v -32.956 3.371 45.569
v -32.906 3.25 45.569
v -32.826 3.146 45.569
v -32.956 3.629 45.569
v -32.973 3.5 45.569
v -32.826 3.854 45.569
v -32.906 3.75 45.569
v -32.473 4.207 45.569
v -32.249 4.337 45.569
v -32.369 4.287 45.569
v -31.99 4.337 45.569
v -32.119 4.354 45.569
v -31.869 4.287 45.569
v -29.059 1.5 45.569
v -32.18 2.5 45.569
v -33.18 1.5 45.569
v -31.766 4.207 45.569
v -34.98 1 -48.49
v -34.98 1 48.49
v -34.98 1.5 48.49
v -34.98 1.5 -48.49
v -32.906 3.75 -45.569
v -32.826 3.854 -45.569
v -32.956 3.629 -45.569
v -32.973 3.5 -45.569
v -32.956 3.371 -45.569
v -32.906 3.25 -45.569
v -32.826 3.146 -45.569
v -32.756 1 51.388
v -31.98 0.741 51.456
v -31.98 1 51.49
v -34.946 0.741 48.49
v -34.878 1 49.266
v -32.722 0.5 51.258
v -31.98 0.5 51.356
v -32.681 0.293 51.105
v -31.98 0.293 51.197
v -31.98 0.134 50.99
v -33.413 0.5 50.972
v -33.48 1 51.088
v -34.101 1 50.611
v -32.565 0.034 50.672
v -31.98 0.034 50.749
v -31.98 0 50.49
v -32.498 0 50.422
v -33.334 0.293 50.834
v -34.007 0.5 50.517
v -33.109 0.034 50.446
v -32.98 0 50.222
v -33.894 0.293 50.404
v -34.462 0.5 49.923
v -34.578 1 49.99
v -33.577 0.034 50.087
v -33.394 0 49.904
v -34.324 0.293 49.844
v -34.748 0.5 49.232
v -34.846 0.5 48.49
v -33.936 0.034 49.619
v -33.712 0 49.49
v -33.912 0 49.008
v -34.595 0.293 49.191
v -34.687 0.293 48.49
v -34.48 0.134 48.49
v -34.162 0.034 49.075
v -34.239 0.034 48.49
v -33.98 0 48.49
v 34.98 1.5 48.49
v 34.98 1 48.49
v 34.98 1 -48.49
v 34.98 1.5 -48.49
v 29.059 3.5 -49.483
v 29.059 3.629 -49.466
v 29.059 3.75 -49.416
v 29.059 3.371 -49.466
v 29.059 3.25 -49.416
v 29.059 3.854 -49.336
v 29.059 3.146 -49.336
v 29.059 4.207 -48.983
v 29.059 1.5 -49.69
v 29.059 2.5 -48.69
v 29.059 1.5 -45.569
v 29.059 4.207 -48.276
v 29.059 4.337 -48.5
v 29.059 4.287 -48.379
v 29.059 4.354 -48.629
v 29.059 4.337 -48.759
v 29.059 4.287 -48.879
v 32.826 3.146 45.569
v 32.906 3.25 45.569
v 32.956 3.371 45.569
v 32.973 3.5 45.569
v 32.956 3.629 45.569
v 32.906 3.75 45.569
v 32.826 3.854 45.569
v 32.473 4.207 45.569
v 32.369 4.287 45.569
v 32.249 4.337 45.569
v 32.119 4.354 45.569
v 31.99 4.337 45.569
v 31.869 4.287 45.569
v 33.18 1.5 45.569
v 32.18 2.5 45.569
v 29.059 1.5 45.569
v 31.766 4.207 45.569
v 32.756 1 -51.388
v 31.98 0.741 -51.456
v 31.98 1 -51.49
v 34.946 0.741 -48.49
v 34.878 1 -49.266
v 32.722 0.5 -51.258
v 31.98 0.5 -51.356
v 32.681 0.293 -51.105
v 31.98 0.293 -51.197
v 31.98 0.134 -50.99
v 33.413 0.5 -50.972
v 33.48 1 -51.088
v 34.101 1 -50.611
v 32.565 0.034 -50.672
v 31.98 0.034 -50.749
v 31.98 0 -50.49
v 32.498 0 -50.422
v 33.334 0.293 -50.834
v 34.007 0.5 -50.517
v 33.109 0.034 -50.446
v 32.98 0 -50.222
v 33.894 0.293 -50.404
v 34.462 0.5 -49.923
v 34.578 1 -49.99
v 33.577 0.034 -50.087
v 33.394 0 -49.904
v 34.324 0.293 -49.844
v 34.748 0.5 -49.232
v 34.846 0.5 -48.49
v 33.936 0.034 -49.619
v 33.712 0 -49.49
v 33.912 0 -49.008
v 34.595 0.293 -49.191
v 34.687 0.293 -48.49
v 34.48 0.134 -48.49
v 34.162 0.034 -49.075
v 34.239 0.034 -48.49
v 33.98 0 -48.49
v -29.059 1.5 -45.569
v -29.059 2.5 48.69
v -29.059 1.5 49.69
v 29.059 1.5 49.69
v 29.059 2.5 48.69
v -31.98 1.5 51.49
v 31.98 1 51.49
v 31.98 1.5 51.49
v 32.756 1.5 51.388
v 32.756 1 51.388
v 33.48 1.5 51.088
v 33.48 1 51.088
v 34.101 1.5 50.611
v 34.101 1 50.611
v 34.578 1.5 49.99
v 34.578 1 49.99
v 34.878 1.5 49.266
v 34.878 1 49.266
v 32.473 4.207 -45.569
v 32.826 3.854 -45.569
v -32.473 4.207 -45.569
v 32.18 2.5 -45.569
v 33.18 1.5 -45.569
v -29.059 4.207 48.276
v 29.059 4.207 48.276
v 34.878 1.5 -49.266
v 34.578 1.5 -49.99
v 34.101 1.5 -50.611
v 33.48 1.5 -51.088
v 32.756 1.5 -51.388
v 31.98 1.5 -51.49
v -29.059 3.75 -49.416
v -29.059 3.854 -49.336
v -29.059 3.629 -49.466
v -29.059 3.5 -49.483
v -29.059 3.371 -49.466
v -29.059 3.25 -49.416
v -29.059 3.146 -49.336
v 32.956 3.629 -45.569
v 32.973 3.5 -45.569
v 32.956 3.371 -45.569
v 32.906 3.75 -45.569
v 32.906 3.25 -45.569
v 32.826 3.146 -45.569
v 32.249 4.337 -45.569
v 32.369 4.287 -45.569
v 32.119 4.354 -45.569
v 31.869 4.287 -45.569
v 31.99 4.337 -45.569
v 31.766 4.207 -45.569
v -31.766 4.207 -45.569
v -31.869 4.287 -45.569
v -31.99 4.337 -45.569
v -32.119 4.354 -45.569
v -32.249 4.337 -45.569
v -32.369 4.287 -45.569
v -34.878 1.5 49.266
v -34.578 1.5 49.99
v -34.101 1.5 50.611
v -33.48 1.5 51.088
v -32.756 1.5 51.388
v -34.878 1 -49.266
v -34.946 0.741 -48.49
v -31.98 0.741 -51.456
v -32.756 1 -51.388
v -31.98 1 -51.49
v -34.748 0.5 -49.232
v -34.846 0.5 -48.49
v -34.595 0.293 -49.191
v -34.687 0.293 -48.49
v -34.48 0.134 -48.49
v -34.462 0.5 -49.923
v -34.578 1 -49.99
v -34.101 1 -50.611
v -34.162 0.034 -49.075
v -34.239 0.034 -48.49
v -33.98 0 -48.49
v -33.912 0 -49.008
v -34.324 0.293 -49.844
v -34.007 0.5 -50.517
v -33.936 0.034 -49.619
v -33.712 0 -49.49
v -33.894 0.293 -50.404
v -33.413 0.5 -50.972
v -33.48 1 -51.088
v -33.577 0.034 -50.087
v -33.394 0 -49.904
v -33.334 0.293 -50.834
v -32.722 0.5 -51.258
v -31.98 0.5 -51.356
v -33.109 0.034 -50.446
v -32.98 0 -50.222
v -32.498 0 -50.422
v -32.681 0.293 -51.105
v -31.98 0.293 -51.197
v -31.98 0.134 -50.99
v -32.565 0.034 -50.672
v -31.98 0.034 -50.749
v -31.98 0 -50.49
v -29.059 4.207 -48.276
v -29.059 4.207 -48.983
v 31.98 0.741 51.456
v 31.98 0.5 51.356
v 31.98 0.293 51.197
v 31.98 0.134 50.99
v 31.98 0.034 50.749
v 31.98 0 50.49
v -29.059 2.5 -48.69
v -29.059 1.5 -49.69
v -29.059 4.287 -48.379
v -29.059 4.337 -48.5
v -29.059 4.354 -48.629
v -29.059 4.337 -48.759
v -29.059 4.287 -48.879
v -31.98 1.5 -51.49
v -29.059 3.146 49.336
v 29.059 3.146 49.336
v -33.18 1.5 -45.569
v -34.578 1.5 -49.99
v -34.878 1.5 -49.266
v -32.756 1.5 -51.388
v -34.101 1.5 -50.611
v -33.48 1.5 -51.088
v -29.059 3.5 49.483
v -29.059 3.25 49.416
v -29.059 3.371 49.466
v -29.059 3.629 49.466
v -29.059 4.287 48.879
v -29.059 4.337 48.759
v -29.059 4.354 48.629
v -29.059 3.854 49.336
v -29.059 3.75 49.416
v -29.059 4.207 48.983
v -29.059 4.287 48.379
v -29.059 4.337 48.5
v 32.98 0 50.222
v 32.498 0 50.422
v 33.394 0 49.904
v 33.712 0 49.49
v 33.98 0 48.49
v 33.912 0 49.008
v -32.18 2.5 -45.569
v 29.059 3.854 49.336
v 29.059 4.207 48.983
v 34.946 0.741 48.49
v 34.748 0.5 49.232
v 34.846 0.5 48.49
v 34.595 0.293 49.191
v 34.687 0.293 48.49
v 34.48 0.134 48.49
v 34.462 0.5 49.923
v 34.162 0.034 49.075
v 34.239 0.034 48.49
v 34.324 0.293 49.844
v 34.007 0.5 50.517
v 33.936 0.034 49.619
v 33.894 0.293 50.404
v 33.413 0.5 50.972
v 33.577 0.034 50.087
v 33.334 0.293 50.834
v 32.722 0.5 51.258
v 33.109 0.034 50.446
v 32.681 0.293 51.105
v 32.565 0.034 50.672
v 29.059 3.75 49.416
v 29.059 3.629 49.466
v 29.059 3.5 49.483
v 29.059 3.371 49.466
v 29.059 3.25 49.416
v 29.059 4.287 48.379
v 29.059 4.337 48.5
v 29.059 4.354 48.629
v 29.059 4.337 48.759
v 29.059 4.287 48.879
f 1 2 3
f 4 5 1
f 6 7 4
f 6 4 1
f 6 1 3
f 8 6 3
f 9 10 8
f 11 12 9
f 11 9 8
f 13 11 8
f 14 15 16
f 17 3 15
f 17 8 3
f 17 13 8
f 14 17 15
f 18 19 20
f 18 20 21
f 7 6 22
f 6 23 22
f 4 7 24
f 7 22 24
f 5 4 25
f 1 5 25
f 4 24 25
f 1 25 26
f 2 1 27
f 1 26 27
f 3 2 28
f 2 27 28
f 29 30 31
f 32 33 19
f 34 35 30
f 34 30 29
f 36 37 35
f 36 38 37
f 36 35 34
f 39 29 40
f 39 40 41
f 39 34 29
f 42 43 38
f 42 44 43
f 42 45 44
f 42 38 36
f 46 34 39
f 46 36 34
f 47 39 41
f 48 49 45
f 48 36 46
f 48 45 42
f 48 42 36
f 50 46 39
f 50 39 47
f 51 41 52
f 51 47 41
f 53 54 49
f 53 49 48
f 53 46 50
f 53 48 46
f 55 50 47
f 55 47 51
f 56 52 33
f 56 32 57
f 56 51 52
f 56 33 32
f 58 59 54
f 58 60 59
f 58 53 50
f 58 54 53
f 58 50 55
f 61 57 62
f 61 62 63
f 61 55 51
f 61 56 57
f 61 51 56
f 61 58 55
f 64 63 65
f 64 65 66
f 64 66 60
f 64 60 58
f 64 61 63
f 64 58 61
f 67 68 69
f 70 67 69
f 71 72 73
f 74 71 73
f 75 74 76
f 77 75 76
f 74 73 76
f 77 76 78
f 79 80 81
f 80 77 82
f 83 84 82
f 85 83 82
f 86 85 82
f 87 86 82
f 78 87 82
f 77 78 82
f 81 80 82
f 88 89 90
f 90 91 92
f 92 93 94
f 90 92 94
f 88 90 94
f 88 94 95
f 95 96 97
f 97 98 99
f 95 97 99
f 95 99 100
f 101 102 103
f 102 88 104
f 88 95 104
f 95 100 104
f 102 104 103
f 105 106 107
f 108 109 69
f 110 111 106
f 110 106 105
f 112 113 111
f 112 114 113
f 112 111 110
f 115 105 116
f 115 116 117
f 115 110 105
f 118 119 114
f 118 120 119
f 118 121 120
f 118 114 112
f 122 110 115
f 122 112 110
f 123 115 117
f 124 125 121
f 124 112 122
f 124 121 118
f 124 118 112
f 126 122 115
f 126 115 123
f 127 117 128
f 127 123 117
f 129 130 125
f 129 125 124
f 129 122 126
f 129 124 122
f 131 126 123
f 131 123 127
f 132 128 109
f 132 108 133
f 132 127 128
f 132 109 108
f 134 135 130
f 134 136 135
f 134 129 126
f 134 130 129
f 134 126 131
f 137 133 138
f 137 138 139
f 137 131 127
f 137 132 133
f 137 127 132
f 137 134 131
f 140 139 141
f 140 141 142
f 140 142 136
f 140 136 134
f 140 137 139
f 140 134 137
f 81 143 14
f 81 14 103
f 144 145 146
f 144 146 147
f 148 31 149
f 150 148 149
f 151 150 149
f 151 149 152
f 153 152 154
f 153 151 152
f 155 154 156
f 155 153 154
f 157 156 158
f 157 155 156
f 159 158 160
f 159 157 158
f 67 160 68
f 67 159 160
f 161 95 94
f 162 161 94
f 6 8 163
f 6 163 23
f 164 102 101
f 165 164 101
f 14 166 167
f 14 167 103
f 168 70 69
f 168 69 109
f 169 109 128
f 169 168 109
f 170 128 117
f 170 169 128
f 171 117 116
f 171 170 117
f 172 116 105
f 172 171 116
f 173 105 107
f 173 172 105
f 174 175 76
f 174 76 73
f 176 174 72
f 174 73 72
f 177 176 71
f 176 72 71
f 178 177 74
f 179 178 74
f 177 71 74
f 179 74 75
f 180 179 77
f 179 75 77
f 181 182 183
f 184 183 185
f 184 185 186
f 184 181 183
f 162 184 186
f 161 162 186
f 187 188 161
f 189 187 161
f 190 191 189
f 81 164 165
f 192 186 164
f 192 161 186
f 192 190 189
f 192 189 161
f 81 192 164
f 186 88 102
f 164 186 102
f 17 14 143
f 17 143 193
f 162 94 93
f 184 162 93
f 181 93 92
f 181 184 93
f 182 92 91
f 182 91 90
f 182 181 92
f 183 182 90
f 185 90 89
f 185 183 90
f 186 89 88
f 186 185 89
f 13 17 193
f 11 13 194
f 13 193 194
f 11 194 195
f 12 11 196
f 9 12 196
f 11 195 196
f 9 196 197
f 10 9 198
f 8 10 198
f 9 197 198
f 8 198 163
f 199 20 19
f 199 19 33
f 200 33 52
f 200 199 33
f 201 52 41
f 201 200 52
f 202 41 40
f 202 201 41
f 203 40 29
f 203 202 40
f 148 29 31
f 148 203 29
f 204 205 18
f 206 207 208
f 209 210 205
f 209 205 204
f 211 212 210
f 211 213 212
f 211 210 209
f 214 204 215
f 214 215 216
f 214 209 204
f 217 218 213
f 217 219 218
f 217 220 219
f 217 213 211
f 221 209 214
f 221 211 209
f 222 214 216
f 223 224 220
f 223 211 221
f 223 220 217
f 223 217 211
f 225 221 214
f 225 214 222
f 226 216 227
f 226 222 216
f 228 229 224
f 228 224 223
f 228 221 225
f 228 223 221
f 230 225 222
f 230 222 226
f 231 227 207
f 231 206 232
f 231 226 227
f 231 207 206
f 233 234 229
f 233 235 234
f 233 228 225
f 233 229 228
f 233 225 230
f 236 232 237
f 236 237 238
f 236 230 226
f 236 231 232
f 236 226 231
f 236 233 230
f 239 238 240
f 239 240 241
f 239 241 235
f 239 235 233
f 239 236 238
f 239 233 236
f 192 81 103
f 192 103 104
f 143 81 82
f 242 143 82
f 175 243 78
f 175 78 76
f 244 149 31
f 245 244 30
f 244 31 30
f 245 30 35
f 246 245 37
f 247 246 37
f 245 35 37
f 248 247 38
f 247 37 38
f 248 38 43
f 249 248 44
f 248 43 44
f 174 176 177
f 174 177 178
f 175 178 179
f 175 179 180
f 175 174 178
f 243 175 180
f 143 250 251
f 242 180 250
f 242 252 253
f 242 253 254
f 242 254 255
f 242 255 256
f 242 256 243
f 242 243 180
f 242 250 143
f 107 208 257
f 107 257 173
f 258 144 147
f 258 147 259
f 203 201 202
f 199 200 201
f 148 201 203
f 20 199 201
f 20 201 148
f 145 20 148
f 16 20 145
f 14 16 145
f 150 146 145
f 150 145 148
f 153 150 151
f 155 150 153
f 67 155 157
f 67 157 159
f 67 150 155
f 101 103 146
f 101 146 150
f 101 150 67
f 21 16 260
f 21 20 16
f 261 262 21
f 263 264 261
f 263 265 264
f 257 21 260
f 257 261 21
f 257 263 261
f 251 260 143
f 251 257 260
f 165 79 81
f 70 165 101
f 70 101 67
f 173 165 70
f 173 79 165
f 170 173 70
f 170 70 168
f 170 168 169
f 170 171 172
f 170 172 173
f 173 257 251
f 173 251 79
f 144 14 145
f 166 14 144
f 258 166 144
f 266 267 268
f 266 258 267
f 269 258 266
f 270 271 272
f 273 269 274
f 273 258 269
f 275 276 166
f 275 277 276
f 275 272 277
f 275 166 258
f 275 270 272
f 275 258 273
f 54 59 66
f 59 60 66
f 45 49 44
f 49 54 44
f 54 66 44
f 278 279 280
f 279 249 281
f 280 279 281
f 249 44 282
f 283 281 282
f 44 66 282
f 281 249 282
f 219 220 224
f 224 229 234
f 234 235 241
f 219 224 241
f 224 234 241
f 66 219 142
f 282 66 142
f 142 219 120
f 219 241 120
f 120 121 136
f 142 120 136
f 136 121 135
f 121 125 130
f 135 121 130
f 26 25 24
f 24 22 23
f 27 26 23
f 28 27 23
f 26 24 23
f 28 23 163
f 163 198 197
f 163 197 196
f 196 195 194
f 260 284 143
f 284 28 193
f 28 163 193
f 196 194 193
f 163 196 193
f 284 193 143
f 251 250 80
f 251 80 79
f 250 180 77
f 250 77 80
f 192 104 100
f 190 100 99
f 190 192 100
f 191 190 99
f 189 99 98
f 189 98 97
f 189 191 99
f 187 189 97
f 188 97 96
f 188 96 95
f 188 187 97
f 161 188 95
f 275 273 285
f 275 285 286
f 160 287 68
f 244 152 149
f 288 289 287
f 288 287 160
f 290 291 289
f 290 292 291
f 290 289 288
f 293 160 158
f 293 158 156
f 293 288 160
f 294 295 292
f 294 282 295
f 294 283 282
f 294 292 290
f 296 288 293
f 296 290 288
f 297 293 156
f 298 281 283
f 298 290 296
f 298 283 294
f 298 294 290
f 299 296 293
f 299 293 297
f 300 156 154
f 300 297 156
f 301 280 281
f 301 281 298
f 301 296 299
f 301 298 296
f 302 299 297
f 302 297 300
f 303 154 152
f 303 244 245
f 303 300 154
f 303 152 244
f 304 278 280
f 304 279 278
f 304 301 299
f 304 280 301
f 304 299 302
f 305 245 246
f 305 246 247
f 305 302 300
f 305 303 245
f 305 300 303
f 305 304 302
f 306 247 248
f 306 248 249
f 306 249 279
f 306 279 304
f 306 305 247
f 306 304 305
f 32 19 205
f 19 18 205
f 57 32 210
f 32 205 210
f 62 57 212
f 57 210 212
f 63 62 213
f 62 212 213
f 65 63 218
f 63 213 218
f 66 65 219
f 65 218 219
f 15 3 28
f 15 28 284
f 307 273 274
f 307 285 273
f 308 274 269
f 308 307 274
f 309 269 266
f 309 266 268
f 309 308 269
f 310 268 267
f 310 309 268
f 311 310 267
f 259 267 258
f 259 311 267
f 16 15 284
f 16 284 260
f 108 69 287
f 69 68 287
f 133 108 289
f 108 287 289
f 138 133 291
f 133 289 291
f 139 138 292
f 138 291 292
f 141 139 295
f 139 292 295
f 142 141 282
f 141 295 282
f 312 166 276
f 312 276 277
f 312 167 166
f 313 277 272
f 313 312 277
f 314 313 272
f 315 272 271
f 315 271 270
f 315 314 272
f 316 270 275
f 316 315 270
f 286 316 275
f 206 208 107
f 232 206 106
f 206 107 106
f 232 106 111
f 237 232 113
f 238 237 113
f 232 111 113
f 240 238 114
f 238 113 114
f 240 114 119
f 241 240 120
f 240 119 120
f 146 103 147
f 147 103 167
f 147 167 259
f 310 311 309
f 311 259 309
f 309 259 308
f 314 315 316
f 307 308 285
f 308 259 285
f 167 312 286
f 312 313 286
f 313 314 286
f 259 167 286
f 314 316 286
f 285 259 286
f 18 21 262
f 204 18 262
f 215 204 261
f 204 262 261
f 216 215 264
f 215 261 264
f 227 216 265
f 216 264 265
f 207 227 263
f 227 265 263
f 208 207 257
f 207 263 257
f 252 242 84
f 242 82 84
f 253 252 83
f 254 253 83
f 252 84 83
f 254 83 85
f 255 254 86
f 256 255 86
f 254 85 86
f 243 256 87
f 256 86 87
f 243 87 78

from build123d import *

# Parameters (mm, degrees)
EDIT_GLOBAL_VARIABLE_WITH_PCB_DIMENSIONS_W = 69.96
EDIT_GLOBAL_VARIABLE_WITH_PCB_DIMENSIONS_H = 102.98
BOSS_EXTRUDE1_DEPTH                        = 1.5
FILLET1_R                                  = 3
BOSS_EXTRUDE2_DEPTH                        = 91.1374
BOSS_EXTRUDE3_DEPTH                        = 91.1374
BOSS_EXTRUDE4_DEPTH                        = 58.1174
BOSS_EXTRUDE5_DEPTH                        = 58.1174
FILLET2_R                                  = 0.5
FILLET3_R                                  = 1


with BuildPart() as part:
    # EDIT GLOBAL VARIABLE WITH PCB DIMENSIONS → Boss-Extrude1 (new body)
    with BuildSketch(Plane(origin=(0, 0, 0), x_dir=(1, 0, 0), z_dir=(0, 1, 0))):
        Rectangle(EDIT_GLOBAL_VARIABLE_WITH_PCB_DIMENSIONS_W, EDIT_GLOBAL_VARIABLE_WITH_PCB_DIMENSIONS_H)
    extrude(amount=BOSS_EXTRUDE1_DEPTH)

    # Fillet1
    fillet1_edges = [part.edges().sort_by_distance(p)[0] for p in [
        (34.98, 0.75, 51.49),
        (-34.98, 0.75, 51.49),
        (-34.98, 0.75, -51.49),
        (34.98, 0.75, -51.49),
    ]]
    fillet(fillet1_edges, radius=FILLET1_R)

    # Sketch2 → Boss-Extrude2 (add)
    with BuildSketch(Plane.XY.offset(45.5687)):
        Polygon((33.18, 1.5), (29.058679656, 1.5), (32.119339828, 4.560660172), (33.18, 3.5), (32.18, 2.5), align=None)
    extrude(amount=-BOSS_EXTRUDE2_DEPTH)

    # Sketch3 → Boss-Extrude3 (add)
    with BuildSketch(Plane.XY.offset(45.5687)):
        Polygon((-33.18, 1.5), (-29.058679656, 1.5), (-32.119339828, 4.560660172), (-33.18, 3.5), (-32.18, 2.5), align=None)
    extrude(amount=-BOSS_EXTRUDE3_DEPTH)

    # Sketch4 → Boss-Extrude4 (add)
    with BuildSketch(Plane.ZY.offset(29.0587)):
        Polygon((-49.69, 1.5), (-45.568679656, 1.5), (-48.629339828, 4.560660172), (-49.69, 3.5), (-48.69, 2.5), align=None)
    extrude(amount=-BOSS_EXTRUDE4_DEPTH)

    # Sketch5 → Boss-Extrude5 (add)
    with BuildSketch(Plane.ZY.offset(29.0587)):
        Polygon((45.568679656, 1.5), (49.69, 1.5), (48.69, 2.5), (49.69, 3.5), (48.629339828, 4.560660172), align=None)
    extrude(amount=-BOSS_EXTRUDE5_DEPTH)

    # Fillet2
    fillet2_edges = [part.edges().sort_by_distance(p)[0] for p in [
        (33.18, 3.5, 0),
        (32.119339828, 4.560660172, 0),
        (-32.119339828, 4.560660172, 0),
        (-33.18, 3.5, 0),
        (0, 4.560660172, -48.629339828),
        (0, 3.5, -49.69),
        (0, 3.5, 49.69),
        (0, 4.560660172, 48.629339828),
    ]]
    fillet(fillet2_edges, radius=FILLET2_R)

    # Fillet3
    fillet3_edges = [part.edges().sort_by_distance(p)[0] for p in [
        (-34.98, 0, 0),
        (34.98, 0, 0),
        (0, 0, 51.49),
        (0, 0, -51.49),
        (-34.101320344, 0, 50.611320344),
        (34.101320344, 0, 50.611320344),
        (34.101320344, 0, -50.611320344),
        (-34.101320344, 0, -50.611320344),
    ]]
    fillet(fillet3_edges, radius=FILLET3_R)


solid = part.part
